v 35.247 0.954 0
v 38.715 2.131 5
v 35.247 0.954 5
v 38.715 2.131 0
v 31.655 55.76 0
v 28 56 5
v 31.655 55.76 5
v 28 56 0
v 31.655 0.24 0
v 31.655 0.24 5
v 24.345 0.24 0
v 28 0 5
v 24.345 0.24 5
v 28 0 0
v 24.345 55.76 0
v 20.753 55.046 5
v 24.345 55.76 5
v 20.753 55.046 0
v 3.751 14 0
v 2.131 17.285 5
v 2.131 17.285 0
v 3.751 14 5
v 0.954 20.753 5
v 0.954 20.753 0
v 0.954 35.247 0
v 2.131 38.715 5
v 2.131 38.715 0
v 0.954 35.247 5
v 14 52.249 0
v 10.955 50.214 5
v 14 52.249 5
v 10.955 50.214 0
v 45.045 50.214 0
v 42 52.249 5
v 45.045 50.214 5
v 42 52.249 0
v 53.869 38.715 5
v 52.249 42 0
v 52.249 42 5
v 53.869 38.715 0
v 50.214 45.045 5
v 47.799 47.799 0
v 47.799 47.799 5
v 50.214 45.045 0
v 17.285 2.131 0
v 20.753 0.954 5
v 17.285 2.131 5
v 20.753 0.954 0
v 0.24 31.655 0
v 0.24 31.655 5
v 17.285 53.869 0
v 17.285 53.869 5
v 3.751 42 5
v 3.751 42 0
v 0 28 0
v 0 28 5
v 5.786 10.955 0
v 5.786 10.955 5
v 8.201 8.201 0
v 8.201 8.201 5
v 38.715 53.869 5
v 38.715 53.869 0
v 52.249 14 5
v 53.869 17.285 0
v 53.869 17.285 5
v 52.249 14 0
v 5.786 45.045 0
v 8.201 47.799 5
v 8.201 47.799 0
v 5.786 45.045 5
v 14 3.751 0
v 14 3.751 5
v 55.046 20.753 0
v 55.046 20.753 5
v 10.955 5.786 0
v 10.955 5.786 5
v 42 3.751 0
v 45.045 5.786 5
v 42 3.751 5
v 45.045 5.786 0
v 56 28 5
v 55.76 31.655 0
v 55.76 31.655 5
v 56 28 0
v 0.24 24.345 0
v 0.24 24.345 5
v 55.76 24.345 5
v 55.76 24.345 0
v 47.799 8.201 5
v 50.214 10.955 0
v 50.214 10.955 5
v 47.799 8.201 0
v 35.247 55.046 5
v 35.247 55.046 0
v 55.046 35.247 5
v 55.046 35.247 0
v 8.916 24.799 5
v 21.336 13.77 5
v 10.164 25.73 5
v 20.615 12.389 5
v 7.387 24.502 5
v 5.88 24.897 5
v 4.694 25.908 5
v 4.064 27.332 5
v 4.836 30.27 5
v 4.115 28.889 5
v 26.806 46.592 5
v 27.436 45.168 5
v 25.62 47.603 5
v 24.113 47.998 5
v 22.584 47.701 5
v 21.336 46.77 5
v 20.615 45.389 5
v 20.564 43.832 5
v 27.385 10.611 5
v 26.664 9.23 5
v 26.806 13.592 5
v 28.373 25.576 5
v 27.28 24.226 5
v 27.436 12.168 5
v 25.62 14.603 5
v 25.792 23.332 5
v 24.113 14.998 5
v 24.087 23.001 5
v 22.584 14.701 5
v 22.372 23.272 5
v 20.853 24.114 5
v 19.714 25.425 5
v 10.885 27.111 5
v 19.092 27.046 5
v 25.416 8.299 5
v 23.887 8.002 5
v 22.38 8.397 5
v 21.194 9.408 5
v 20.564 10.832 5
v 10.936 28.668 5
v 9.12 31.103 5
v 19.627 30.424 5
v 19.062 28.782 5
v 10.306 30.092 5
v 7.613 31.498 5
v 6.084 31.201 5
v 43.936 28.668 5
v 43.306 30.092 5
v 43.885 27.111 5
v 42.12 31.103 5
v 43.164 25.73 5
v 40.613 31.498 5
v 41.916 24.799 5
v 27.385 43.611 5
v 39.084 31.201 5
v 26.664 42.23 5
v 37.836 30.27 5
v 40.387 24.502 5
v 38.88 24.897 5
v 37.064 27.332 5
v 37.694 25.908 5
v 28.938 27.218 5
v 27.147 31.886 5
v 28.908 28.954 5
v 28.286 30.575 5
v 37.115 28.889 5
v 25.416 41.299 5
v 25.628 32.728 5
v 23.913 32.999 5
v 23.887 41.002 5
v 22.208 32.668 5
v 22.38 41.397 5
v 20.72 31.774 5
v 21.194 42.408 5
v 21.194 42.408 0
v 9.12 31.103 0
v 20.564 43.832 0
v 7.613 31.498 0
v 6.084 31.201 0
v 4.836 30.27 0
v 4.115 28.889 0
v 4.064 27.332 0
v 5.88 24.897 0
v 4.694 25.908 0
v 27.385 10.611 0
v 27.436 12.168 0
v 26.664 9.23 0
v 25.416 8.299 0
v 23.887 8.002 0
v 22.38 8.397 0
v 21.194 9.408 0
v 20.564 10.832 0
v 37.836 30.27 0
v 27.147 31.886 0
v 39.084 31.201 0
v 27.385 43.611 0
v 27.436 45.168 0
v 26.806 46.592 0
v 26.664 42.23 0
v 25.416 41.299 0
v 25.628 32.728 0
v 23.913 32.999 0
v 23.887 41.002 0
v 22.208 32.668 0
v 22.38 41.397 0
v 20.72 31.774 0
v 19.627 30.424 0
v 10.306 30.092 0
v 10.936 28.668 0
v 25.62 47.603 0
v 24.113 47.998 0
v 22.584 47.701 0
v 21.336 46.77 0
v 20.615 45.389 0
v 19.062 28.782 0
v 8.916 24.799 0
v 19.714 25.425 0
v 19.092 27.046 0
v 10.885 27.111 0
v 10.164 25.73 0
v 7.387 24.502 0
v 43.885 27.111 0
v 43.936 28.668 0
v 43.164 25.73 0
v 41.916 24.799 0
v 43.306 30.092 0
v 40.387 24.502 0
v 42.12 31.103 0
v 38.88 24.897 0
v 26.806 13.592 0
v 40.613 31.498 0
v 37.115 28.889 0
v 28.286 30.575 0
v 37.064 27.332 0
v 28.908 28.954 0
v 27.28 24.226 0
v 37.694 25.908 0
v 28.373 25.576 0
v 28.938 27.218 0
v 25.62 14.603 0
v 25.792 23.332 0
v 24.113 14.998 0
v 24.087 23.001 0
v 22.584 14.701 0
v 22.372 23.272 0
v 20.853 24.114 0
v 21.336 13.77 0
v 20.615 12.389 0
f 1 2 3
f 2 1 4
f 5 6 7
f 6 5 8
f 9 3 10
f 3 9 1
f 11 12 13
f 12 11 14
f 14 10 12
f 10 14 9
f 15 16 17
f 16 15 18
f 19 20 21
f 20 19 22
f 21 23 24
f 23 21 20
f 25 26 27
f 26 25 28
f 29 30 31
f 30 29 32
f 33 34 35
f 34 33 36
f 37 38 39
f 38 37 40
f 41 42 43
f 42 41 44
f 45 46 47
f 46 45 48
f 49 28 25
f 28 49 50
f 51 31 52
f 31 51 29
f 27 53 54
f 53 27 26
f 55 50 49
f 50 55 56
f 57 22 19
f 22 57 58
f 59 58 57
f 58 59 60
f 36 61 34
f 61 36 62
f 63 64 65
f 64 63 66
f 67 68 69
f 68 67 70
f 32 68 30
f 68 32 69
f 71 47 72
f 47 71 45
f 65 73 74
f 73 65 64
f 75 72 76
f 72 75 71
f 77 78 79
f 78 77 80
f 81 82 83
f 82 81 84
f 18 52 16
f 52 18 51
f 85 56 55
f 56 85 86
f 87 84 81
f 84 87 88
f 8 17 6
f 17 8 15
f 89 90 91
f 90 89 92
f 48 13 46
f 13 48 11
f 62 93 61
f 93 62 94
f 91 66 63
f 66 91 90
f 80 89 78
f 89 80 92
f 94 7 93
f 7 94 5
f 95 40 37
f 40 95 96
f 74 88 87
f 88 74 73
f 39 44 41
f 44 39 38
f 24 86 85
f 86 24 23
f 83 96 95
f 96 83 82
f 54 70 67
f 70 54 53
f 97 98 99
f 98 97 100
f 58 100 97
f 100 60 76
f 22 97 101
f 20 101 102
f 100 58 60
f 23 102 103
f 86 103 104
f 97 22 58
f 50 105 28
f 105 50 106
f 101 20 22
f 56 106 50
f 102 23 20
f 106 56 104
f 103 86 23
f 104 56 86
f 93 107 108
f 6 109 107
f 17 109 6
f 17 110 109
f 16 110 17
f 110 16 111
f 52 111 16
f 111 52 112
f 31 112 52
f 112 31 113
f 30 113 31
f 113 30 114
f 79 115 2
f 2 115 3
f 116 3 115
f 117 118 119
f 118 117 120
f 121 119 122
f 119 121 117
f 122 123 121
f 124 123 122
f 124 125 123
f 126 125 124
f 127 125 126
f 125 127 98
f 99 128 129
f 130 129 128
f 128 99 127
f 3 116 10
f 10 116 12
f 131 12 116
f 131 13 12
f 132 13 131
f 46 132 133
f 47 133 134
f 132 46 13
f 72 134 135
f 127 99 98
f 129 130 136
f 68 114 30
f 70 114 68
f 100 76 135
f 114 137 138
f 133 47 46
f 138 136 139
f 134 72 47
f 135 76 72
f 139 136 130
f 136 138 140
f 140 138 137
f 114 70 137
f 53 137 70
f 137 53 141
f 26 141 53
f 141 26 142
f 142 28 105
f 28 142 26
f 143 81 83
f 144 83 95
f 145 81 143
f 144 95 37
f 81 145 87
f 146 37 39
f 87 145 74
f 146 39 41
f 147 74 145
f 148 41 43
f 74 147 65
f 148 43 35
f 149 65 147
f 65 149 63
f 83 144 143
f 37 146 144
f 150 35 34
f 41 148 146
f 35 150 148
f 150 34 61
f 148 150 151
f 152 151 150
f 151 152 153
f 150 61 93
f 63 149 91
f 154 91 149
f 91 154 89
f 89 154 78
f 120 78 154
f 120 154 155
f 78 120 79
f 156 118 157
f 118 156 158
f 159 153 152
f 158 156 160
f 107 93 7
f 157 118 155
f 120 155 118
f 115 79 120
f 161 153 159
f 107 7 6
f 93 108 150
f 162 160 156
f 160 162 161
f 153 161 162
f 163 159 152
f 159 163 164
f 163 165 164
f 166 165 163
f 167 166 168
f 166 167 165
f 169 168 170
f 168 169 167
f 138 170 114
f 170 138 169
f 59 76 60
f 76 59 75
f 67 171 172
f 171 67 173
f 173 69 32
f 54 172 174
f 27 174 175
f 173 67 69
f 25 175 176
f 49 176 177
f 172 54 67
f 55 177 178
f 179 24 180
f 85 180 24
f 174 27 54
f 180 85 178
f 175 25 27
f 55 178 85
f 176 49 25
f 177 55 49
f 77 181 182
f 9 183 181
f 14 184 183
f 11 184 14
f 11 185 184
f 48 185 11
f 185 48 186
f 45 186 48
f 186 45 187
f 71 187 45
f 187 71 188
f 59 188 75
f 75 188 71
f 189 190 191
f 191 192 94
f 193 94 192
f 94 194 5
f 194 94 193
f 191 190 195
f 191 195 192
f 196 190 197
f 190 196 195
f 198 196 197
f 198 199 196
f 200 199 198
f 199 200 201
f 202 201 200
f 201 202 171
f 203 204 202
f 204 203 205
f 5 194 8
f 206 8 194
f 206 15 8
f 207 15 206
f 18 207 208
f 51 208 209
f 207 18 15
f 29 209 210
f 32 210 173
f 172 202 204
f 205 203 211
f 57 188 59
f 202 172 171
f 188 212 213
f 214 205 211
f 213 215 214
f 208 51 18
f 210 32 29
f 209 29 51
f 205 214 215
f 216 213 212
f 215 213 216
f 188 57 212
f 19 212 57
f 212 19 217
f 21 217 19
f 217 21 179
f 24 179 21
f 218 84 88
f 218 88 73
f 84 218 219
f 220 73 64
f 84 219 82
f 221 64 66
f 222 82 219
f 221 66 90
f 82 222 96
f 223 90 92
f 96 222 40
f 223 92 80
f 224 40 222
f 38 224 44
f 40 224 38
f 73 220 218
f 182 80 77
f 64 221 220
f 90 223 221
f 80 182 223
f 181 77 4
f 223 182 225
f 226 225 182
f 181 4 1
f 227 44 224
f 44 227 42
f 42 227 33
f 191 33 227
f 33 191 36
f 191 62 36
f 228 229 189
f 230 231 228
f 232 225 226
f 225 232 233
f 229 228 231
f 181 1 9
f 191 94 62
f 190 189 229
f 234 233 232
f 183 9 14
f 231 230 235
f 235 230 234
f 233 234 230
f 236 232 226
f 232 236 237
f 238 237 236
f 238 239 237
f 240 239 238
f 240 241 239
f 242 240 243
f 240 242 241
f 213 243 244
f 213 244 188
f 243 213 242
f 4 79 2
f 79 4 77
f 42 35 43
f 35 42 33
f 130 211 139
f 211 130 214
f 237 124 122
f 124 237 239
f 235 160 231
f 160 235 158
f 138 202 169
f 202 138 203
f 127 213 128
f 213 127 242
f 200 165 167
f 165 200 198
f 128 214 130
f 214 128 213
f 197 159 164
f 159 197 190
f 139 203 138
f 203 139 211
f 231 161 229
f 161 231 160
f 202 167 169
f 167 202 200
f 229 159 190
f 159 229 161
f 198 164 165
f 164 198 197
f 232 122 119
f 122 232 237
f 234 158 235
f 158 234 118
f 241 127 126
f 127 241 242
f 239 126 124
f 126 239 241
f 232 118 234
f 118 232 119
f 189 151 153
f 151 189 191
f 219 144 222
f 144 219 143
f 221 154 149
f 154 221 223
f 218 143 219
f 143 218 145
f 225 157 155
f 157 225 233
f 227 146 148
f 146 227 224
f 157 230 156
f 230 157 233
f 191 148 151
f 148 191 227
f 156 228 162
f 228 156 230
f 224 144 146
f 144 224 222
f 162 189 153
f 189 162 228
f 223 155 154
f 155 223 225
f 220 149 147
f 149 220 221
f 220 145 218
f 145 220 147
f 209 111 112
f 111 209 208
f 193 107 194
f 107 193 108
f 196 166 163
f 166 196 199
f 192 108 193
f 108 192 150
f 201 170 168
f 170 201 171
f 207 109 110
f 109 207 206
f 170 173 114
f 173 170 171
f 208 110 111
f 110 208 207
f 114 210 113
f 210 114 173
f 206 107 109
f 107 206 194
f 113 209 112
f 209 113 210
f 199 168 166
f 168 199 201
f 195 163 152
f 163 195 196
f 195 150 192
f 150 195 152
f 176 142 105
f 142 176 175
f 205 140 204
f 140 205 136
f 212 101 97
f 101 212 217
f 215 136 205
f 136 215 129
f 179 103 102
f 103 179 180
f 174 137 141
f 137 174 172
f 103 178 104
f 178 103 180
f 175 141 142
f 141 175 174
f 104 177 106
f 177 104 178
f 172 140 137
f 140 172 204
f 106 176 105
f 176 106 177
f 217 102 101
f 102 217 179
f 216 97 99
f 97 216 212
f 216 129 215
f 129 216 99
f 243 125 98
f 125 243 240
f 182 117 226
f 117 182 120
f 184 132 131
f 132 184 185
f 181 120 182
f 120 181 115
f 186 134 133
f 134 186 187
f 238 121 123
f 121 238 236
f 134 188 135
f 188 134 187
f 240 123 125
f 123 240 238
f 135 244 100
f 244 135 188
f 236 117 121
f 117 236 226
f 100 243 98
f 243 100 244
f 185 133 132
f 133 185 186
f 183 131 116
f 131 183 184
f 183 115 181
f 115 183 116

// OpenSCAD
$fn = 32;

// ----------------------------------------------------------------------
// Cam plate: eccentric cam, base R28
// ----------------------------------------------------------------------

// --- parameters (mm) ---
base_r = 28;              // base circle radius
lobe_h = 14;              // cam lobe rise
bore_r = 5;               // shaft bore radius
plate_t = 5;              // plate thickness, Z (extrusion height)
ecc = 4;                  // disc eccentricity
ring_r = 16.5;            // lightening ring radius
bolt_r = 3.5;             // lightening hole radius

profile = [[56, 28], [55.76, 31.655], [55.046, 35.247], [53.869, 38.715], [52.249, 42], [50.214, 45.045], [47.799, 47.799], [45.045, 50.214], [42, 52.249], [38.715, 53.869], [35.247, 55.046], [31.655, 55.76], [28, 56], [24.345, 55.76], [20.753, 55.046], [17.285, 53.869], [14, 52.249], [10.955, 50.214], [8.201, 47.799], [5.786, 45.045], [3.751, 42], [2.131, 38.715], [0.954, 35.247], [0.24, 31.655], [0, 28], [0.24, 24.345], [0.954, 20.753], [2.131, 17.285], [3.751, 14], [5.786, 10.955], [8.201, 8.201], [10.955, 5.786], [14, 3.751], [17.285, 2.131], [20.753, 0.954], [24.345, 0.24], [28, 0], [31.655, 0.24], [35.247, 0.954], [38.715, 2.131], [42, 3.751], [45.045, 5.786], [47.799, 8.201], [50.214, 10.955], [52.249, 14], [53.869, 17.285], [55.046, 20.753], [55.76, 24.345]];  // primary outline, 48 points, counter clockwise
void_1 = [[28.908, 28.954], [28.286, 30.575], [27.147, 31.886], [25.628, 32.728], [23.913, 32.999], [22.208, 32.668], [20.72, 31.774], [19.627, 30.424], [19.062, 28.782], [19.092, 27.046], [19.714, 25.425], [20.853, 24.114], [22.372, 23.272], [24.087, 23.001], [25.792, 23.332], [27.28, 24.226], [28.373, 25.576], [28.938, 27.218]];  // shaft bore, 18 points
void_2 = [[43.936, 28.668], [43.306, 30.092], [42.12, 31.103], [40.613, 31.498], [39.084, 31.201], [37.836, 30.27], [37.115, 28.889], [37.064, 27.332], [37.694, 25.908], [38.88, 24.897], [40.387, 24.502], [41.916, 24.799], [43.164, 25.73], [43.885, 27.111]];  // lightening hole 1, 14 points
void_3 = [[27.436, 45.168], [26.806, 46.592], [25.62, 47.603], [24.113, 47.998], [22.584, 47.701], [21.336, 46.77], [20.615, 45.389], [20.564, 43.832], [21.194, 42.408], [22.38, 41.397], [23.887, 41.002], [25.416, 41.299], [26.664, 42.23], [27.385, 43.611]];  // lightening hole 2, 14 points
void_4 = [[10.936, 28.668], [10.306, 30.092], [9.12, 31.103], [7.613, 31.498], [6.084, 31.201], [4.836, 30.27], [4.115, 28.889], [4.064, 27.332], [4.694, 25.908], [5.88, 24.897], [7.387, 24.502], [8.916, 24.799], [10.164, 25.73], [10.885, 27.111]];  // lightening hole 3, 14 points
void_5 = [[27.436, 12.168], [26.806, 13.592], [25.62, 14.603], [24.113, 14.998], [22.584, 14.701], [21.336, 13.77], [20.615, 12.389], [20.564, 10.832], [21.194, 9.408], [22.38, 8.397], [23.887, 8.002], [25.416, 8.299], [26.664, 9.23], [27.385, 10.611]];  // lightening hole 4, 14 points

// --- the one profile operation ---
difference() {
  linear_extrude(height = plate_t) polygon(points = profile);
  translate([0, 0, -1])
    linear_extrude(height = plate_t + 2) polygon(points = void_1);
  translate([0, 0, -1])
    linear_extrude(height = plate_t + 2) polygon(points = void_2);
  translate([0, 0, -1])
    linear_extrude(height = plate_t + 2) polygon(points = void_3);
  translate([0, 0, -1])
    linear_extrude(height = plate_t + 2) polygon(points = void_4);
  translate([0, 0, -1])
    linear_extrude(height = plate_t + 2) polygon(points = void_5);
}
